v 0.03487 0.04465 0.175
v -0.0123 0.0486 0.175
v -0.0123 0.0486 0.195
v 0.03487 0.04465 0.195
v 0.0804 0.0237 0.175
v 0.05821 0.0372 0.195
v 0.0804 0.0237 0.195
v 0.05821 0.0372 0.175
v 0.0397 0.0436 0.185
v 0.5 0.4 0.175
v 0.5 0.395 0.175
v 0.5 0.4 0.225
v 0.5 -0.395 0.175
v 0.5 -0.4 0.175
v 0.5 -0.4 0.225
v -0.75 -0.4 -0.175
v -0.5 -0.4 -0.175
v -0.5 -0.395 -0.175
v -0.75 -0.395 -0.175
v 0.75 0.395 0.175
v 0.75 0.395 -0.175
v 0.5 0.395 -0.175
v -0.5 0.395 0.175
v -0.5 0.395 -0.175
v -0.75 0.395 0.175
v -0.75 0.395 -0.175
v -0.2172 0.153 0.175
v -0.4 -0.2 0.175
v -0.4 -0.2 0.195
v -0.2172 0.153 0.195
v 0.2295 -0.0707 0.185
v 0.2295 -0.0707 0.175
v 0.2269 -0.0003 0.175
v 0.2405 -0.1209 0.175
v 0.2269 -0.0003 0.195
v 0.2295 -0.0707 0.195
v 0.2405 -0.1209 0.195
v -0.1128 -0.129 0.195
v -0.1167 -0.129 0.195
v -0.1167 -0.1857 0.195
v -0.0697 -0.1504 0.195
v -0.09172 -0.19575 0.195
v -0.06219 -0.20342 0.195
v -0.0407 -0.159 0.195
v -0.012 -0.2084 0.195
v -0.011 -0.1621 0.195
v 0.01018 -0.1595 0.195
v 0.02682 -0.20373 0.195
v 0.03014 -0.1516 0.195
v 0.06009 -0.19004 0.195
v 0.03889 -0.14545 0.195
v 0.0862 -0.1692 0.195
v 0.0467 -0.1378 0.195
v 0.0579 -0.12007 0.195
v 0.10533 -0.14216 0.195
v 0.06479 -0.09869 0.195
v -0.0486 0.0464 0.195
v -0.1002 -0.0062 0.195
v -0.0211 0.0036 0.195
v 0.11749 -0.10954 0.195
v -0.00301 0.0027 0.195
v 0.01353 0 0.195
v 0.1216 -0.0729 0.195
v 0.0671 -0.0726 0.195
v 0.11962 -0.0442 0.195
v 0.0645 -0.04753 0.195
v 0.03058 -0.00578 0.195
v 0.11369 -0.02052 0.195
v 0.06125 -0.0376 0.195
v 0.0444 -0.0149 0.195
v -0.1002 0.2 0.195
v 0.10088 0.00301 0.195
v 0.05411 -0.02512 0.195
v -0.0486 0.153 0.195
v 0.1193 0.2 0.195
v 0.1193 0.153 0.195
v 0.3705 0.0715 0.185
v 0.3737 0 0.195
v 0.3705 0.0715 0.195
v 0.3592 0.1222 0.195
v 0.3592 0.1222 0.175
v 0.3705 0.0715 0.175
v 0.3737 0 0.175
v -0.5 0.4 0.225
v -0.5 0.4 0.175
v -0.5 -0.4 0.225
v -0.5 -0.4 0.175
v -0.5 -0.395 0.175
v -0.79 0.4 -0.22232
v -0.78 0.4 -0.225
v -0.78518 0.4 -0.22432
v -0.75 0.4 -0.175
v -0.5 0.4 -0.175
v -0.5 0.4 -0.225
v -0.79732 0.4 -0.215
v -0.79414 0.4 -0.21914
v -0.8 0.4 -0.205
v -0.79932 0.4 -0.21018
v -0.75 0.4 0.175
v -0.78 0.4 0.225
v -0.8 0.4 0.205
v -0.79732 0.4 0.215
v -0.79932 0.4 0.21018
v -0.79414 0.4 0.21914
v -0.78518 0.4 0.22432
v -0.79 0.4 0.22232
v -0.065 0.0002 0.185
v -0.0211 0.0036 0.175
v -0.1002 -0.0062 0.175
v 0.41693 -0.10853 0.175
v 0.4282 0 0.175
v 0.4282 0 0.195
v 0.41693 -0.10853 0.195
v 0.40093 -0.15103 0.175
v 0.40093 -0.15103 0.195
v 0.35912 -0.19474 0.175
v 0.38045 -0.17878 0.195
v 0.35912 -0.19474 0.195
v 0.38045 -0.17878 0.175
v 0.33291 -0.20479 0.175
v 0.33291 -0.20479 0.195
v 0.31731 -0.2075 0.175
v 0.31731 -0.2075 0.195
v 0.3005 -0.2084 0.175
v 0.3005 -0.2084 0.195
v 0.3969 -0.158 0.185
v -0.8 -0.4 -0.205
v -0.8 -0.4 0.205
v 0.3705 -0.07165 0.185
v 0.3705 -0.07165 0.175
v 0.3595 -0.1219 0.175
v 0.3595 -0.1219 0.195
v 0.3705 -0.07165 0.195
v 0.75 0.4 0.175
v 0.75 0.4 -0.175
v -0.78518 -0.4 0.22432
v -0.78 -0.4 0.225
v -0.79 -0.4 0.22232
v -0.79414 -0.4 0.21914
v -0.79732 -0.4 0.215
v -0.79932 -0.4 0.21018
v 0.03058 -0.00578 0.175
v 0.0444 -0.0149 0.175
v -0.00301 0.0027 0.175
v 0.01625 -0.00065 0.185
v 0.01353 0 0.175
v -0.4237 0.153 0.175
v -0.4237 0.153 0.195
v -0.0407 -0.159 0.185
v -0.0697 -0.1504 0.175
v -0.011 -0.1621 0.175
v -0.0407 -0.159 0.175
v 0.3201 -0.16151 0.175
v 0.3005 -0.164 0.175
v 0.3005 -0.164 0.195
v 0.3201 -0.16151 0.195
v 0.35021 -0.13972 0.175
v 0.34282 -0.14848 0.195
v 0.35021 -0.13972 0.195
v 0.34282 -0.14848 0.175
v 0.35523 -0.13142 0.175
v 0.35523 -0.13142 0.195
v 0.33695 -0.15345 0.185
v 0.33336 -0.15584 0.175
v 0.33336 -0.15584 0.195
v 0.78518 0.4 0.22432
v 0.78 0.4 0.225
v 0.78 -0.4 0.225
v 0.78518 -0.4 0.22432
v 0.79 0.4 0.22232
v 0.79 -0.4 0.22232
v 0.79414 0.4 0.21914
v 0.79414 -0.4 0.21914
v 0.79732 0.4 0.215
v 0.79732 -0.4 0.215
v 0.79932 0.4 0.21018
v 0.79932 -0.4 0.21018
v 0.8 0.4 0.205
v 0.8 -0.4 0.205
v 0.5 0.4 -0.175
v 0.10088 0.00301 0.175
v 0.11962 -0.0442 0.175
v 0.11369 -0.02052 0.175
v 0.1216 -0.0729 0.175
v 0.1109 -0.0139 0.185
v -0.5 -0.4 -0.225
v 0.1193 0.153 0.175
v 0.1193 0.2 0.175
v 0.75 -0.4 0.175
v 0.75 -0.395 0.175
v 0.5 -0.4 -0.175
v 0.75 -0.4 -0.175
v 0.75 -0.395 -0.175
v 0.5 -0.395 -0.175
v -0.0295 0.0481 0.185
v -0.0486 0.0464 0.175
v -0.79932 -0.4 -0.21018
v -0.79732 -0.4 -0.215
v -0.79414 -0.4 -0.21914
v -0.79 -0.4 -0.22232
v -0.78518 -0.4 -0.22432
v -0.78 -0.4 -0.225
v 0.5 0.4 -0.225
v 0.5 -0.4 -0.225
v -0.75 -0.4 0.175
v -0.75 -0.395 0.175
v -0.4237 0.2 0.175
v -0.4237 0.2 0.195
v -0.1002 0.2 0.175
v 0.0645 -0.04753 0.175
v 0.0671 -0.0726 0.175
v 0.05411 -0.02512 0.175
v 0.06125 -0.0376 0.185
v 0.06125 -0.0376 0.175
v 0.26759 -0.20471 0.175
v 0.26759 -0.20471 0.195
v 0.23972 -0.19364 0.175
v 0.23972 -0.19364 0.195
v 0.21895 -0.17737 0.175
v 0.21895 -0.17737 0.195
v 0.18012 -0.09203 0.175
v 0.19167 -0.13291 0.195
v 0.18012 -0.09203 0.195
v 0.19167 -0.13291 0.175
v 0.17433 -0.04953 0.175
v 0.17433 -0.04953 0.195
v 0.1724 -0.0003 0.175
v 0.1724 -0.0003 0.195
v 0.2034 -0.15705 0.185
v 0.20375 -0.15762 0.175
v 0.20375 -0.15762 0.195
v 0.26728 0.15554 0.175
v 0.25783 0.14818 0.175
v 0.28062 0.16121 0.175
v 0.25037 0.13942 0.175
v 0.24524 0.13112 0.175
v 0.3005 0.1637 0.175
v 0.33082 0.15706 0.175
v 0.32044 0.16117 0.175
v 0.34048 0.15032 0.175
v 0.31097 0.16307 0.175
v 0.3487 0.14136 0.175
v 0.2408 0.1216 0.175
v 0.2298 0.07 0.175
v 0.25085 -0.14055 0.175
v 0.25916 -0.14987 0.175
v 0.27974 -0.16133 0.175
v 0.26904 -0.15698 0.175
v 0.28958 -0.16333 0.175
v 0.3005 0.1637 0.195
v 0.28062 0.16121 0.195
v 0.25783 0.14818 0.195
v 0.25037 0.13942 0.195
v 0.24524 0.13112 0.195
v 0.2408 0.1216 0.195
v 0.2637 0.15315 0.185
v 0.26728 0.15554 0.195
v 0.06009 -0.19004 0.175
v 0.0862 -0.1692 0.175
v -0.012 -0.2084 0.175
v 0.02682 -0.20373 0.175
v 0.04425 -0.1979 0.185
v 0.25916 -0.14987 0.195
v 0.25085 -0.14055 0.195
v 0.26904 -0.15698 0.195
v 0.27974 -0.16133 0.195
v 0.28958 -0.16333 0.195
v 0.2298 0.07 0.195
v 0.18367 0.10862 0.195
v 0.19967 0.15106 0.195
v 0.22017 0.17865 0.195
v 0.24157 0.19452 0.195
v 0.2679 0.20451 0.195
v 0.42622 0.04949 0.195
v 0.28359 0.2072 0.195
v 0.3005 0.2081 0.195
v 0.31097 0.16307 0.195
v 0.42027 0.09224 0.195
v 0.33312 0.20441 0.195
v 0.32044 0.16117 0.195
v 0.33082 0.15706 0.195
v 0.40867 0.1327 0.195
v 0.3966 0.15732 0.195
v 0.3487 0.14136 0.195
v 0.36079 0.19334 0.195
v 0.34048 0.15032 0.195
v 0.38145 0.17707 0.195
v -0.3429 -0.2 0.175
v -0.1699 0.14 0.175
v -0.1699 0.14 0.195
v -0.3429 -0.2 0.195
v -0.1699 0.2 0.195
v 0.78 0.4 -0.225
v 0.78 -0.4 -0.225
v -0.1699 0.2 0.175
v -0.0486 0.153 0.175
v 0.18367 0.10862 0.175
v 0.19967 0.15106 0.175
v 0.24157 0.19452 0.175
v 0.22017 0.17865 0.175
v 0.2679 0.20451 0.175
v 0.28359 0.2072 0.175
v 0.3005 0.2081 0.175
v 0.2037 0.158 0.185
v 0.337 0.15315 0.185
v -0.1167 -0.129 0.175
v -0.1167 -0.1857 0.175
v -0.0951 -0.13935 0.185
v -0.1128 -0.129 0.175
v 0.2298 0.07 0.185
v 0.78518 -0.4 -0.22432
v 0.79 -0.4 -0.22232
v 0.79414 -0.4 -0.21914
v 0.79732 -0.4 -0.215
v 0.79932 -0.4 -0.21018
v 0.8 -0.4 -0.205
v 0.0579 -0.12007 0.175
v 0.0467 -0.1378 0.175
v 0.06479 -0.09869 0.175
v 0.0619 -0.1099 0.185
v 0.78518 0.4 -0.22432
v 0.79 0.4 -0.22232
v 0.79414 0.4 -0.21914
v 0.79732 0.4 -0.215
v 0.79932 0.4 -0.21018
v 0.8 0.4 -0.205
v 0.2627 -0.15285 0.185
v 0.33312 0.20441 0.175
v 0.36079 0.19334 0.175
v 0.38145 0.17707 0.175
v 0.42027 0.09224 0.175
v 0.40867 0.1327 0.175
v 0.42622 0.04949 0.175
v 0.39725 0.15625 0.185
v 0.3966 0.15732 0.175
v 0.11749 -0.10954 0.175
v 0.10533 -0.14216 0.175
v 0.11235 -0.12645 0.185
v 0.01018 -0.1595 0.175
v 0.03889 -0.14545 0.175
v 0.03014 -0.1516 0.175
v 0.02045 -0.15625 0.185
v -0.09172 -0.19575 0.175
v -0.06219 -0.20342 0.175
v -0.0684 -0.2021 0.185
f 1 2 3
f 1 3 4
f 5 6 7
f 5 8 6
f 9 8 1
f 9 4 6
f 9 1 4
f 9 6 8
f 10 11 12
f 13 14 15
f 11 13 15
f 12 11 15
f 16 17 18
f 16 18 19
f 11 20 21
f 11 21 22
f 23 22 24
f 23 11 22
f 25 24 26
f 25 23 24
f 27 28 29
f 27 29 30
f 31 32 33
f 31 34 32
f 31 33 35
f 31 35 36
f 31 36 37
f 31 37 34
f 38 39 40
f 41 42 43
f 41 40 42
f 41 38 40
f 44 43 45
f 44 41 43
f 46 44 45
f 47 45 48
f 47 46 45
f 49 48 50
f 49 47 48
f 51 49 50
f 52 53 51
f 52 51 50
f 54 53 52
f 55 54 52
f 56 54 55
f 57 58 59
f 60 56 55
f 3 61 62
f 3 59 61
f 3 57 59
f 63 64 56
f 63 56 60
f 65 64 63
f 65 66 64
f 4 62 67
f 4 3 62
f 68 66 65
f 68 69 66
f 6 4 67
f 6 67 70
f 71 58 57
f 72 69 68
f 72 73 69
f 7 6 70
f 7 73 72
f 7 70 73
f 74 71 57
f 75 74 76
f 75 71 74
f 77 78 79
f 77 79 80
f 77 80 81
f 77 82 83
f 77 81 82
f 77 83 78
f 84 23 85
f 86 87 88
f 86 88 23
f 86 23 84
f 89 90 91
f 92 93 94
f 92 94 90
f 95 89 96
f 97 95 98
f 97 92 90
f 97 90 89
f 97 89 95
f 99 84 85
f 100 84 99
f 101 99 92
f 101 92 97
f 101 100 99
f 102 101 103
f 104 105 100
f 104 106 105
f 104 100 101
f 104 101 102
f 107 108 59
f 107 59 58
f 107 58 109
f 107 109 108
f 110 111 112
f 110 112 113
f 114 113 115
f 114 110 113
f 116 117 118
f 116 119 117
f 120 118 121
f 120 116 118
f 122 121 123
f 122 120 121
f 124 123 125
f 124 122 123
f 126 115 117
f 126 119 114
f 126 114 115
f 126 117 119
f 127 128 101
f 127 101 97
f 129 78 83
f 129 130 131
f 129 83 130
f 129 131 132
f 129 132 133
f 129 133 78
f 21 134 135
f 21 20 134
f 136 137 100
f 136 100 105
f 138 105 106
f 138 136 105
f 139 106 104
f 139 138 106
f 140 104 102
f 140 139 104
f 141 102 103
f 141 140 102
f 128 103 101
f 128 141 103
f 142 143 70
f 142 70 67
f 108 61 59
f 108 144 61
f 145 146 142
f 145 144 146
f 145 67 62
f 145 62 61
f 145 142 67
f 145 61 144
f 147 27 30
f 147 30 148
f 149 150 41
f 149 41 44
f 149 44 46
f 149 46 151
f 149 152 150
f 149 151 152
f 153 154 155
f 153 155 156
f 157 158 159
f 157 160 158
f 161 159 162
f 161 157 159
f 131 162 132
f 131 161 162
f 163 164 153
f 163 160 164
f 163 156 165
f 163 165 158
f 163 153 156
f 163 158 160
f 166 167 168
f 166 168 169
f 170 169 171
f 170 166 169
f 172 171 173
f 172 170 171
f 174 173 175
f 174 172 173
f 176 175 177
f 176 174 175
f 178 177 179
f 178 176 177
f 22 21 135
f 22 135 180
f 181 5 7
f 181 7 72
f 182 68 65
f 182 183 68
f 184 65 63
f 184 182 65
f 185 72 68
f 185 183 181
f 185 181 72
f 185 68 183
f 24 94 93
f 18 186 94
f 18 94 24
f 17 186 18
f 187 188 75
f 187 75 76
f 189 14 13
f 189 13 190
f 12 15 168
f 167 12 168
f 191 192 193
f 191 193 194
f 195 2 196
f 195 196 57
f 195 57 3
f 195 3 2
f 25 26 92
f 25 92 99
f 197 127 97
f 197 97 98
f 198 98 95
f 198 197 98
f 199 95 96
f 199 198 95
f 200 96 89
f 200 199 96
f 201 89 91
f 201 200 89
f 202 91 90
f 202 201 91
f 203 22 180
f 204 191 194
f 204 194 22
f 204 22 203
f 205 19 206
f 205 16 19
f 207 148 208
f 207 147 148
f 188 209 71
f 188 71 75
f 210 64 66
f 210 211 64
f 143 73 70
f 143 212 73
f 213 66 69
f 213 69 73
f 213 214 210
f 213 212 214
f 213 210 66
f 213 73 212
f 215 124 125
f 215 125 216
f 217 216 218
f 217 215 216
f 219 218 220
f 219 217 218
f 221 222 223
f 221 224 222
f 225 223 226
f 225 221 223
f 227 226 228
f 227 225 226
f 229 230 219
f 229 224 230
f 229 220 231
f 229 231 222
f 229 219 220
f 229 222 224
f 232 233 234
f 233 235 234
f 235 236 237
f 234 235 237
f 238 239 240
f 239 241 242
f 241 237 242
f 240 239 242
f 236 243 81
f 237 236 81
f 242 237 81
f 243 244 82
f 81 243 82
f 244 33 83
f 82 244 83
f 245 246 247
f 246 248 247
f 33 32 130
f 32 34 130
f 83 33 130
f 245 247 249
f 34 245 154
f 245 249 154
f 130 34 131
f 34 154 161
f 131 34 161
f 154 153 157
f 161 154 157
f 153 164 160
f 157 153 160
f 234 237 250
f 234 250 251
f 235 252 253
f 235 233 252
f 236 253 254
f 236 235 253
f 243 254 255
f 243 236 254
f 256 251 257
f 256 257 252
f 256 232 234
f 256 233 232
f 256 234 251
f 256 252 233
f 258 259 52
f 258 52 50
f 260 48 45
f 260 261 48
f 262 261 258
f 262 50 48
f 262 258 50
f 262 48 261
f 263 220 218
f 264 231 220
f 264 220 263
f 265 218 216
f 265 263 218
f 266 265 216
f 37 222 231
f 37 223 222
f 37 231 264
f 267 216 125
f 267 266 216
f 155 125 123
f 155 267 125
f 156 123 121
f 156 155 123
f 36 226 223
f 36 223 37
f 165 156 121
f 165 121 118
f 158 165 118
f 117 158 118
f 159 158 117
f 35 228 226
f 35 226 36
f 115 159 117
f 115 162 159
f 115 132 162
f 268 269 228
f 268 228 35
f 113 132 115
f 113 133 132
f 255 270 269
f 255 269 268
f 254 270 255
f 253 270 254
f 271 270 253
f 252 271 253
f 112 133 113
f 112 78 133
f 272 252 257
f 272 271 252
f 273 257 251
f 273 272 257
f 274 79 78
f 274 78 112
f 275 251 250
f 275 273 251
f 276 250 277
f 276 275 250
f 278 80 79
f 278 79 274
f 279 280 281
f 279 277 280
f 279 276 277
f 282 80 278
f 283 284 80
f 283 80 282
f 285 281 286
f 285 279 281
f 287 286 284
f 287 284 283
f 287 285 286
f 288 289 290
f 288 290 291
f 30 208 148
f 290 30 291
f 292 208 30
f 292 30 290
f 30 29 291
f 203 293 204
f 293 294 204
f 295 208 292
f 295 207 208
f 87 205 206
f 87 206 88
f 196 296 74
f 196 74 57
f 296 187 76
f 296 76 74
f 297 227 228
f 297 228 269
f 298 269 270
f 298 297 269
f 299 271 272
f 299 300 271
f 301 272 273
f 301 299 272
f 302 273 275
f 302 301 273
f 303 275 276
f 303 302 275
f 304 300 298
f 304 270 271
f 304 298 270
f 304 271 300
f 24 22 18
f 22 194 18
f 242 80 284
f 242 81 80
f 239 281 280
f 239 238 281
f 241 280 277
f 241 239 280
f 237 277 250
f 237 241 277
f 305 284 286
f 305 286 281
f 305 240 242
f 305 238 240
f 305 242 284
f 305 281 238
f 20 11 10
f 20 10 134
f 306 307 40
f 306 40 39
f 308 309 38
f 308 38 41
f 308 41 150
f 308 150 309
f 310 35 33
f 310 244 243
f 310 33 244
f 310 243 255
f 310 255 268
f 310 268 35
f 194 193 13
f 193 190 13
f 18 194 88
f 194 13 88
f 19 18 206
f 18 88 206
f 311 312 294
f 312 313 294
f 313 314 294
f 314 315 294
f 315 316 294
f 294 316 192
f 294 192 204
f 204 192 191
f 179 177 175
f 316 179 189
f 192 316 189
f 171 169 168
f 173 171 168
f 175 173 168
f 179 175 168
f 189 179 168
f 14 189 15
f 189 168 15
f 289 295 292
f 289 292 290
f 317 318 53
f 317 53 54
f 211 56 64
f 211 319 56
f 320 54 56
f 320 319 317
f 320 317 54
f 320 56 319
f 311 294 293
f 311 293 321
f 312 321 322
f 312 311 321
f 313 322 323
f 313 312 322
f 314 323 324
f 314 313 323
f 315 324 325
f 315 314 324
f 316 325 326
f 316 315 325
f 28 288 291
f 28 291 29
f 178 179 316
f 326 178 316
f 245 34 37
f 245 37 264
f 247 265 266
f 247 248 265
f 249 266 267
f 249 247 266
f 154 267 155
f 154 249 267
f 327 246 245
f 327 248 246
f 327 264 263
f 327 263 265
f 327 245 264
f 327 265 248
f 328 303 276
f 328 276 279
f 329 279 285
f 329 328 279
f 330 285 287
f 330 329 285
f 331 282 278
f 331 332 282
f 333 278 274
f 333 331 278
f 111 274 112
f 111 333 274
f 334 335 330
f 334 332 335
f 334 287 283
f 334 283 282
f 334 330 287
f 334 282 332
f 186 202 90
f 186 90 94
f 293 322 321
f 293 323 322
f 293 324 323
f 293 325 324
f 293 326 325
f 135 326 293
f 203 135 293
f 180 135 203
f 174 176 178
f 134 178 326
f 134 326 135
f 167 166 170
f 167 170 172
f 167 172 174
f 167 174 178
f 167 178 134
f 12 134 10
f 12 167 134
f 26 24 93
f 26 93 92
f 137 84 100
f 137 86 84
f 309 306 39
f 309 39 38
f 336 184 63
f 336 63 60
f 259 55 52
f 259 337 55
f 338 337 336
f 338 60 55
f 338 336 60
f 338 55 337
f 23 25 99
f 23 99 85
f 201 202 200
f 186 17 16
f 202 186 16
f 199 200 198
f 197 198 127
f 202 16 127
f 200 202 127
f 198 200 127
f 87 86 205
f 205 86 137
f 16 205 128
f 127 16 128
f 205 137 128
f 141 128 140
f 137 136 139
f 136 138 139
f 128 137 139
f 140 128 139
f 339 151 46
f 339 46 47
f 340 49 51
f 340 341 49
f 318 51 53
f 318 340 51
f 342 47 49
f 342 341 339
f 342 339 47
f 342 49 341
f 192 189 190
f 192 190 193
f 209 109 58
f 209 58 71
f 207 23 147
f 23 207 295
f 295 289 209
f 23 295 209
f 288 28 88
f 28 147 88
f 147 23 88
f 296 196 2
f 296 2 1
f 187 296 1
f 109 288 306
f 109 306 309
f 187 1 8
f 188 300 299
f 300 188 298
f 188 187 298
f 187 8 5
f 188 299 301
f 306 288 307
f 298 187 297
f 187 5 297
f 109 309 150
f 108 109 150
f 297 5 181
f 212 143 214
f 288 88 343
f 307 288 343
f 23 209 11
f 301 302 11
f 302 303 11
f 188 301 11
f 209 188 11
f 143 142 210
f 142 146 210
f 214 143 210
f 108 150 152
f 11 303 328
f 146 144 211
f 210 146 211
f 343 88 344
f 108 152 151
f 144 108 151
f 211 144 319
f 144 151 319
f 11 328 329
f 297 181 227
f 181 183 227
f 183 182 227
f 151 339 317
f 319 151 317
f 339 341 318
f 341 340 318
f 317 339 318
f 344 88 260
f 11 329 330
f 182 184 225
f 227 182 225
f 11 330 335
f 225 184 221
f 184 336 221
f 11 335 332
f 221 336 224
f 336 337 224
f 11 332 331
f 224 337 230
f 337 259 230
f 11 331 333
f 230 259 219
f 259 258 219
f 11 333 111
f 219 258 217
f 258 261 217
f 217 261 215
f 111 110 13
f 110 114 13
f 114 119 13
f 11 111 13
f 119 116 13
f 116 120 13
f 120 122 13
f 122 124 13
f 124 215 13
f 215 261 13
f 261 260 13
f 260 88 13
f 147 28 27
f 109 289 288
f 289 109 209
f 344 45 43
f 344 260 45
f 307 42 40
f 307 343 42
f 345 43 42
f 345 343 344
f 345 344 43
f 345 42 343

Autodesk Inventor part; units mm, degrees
ref_plane "YZ Plane" through (0, 0, 0) normal (1, 0, 0) x (0, 1, 0)
ref_plane "XZ Plane" through (0, 0, 0) normal (0, 1, 0) x (-1, 0, 0)
ref_plane "XY Plane" through (0, 0, 0) normal (0, 0, 1) x (1, 0, 0)
sketch "Sketch1" plane through (0, 0, 0) normal (0, 1, 0) x (-1, 0, 0)
  line L0 (0.75, 0.175) -> (-0.75, 0.175)
  line L1 (-0.75, 0.175) -> (-0.75, -0.175)
  line L2 (-0.75, -0.175) -> (0.75, -0.175)
  line L3 (0.75, -0.175) -> (0.75, 0.175)
  line L4 (0.5, 0.175) -> (0.5, 0.225)
  line L5 (0.5, 0.225) -> (0.8, 0.225)
  line L6 (0.8, 0.225) -> (0.8, -0.225)
  line L7 (0.8, -0.225) -> (0.5, -0.225)
  line L8 (0.5, -0.225) -> (0.5, -0.175)
  line L9 (-0.5, 0.175) -> (-0.5, 0.225)
  line L10 (-0.5, 0.225) -> (-0.8, 0.225)
  line L11 (-0.8, 0.225) -> (-0.8, -0.225)
  line L12 (-0.8, -0.225) -> (-0.5, -0.225)
  line L13 (-0.5, -0.175) -> (-0.5, -0.225)
  line L14 (0.5, 0.175) -> (-0.5, 0.175)
  point P0 (0, 0)
  point P1 (0, 0.175)
  point P2 (0.75, 0)
  dimension "d0" = 1.6
  dimension "d1" = 0.05
  dimension "d2" = 0.05
  dimension "d3" = 0.45
  dimension "d4" = 0.3
extrude "Extrusion1" add sketch "Sketch1" along normal mid plane 0.8 contours L0 L4 L5 L6 L7 L8 L2 L3 | L0 L1 L2 L13 L12 L11 L10 L9
extrude "Extrusion2" add sketch "Sketch1" along normal mid plane 0.79 contours L3 L2 L1 L0
sketch "Sketch2" plane through (-0.5, -0.395, 0.175) normal (0, 0, 1) x (1, 0, 0)
  line L0 (0, 0) -> (0, 0.79) projected
  line L1 (1, 0) -> (0, 0) projected
  line L2 (1, 0) -> (1, 0.79) projected
  line L3 (0, 0.79) -> (1, 0.79) projected
  line L4 (0, 0.395) -> (1, 0.395) construction
  line L5 (0.3301, 0.535) -> (0.1571, 0.195)
  line L6 (0.1571, 0.195) -> (0.1, 0.195)
  line L7 (0.1, 0.195) -> (0.2828, 0.548)
  line L8 (0.2828, 0.548) -> (0.0763, 0.548)
  line L9 (0.0763, 0.548) -> (0.0763, 0.595)
  line L10 (0.0763, 0.595) -> (0.3301, 0.595)
  line L11 (0.3301, 0.595) -> (0.3301, 0.535)
  spline S0 degree 2 poles (0.6216, 0.3221) (0.6216, 0.2932) (0.6031, 0.2439) (0.5862, 0.2258) knots 0 0 0 1 2 2 2
  spline S1 degree 2 poles (0.5862, 0.2258) (0.5694, 0.2076) (0.5191, 0.1866) (0.488, 0.1866) knots 0 0 0 1 2 2 2
  spline S2 degree 2 poles (0.488, 0.1866) (0.4595, 0.1866) (0.4037, 0.1992) (0.3833, 0.2093) knots 0 0 0 1 2 2 2
  line L12 (0.3833, 0.2093) -> (0.3833, 0.266)
  line L13 (0.3833, 0.266) -> (0.3872, 0.266)
  spline S3 degree 2 poles (0.3872, 0.266) (0.3934, 0.2615) (0.4164, 0.2498) (0.4303, 0.2446) knots 0 0 0 1 2 2 2
  spline S4 degree 2 poles (0.4303, 0.2446) (0.4462, 0.2391) (0.4724, 0.2329) (0.489, 0.2329) knots 0 0 0 1 2 2 2
  spline S5 degree 2 poles (0.489, 0.2329) (0.5052, 0.2329) (0.5357, 0.2446) (0.5467, 0.2572) knots 0 0 0 1 2 2 2
  spline S6 degree 2 poles (0.5467, 0.2572) (0.5567, 0.2692) (0.5671, 0.301) (0.5671, 0.3224) knots 0 0 0 1 2 2 2
  spline S7 degree 2 poles (0.5671, 0.3224) (0.5671, 0.3438) (0.5554, 0.371) (0.5444, 0.3801) knots 0 0 0 1 2 2 2
  spline S8 degree 2 poles (0.5444, 0.3801) (0.5331, 0.3901) (0.4994, 0.3986) (0.4789, 0.3986) knots 0 0 0 1 2 2 2
  spline S9 degree 2 poles (0.4789, 0.3986) (0.4569, 0.3986) (0.4131, 0.3918) (0.3998, 0.3888) knots 0 0 0 1 2 2 2
  line L14 (0.3998, 0.3888) -> (0.3998, 0.595)
  line L15 (0.3998, 0.595) -> (0.6193, 0.595)
  line L16 (0.6193, 0.595) -> (0.6193, 0.548)
  line L17 (0.6193, 0.548) -> (0.4514, 0.548)
  line L18 (0.4514, 0.548) -> (0.4514, 0.4414)
  spline S10 degree 2 poles (0.4514, 0.4414) (0.4611, 0.4426) (0.4799, 0.4436) (0.4877, 0.4436) knots 0 0 0 1 2 2 2
  spline S11 degree 2 poles (0.4877, 0.4436) (0.5185, 0.4436) (0.5609, 0.4336) (0.5804, 0.4187) knots 0 0 0 1 2 2 2
  spline S12 degree 2 poles (0.5804, 0.4187) (0.6002, 0.4038) (0.6216, 0.3584) (0.6216, 0.3221) knots 0 0 0 1 2 2 2
  spline S13 degree 2 poles (0.9282, 0.395) (0.9282, 0.2874) (0.8656, 0.1866) (0.8005, 0.1866) knots 0 0 0 1 2 2 2
  spline S14 degree 2 poles (0.8005, 0.1866) (0.7344, 0.1866) (0.6724, 0.2893) (0.6724, 0.3947) knots 0 0 0 1 2 2 2
  spline S15 degree 2 poles (0.6724, 0.3947) (0.6724, 0.5029) (0.735, 0.6031) (0.8005, 0.6031) knots 0 0 0 1 2 2 2
  spline S16 degree 2 poles (0.8005, 0.6031) (0.8663, 0.6031) (0.9282, 0.4994) (0.9282, 0.395) knots 0 0 0 1 2 2 2
  spline S17 degree 2 poles (0.8595, 0.2731) (0.8673, 0.2929) (0.8737, 0.3538) (0.8737, 0.395) knots 0 0 0 1 2 2 2
  spline S18 degree 2 poles (0.8737, 0.395) (0.8737, 0.4362) (0.8673, 0.4968) (0.8592, 0.5172) knots 0 0 0 1 2 2 2
  spline S19 degree 2 poles (0.8592, 0.5172) (0.8511, 0.5376) (0.8229, 0.5587) (0.8005, 0.5587) knots 0 0 0 1 2 2 2
  spline S20 degree 2 poles (0.8005, 0.5587) (0.7781, 0.5587) (0.7493, 0.5376) (0.7408, 0.5166) knots 0 0 0 1 2 2 2
  spline S21 degree 2 poles (0.7408, 0.5166) (0.7327, 0.4961) (0.7269, 0.4339) (0.7269, 0.3947) knots 0 0 0 1 2 2 2
  spline S22 degree 2 poles (0.7269, 0.3947) (0.7269, 0.3525) (0.7321, 0.2961) (0.7405, 0.2741) knots 0 0 0 1 2 2 2
  spline S23 degree 2 poles (0.7405, 0.2741) (0.7483, 0.2533) (0.7771, 0.231) (0.8005, 0.231) knots 0 0 0 1 2 2 2
  spline S24 degree 2 poles (0.8005, 0.231) (0.8225, 0.231) (0.8514, 0.2521) (0.8595, 0.2731) knots 0 0 0 1 2 2 2
  point P0 (0.5, 0.395)
extrude "Extrusion3" add sketch "Sketch2" along normal blind 0.02 contours L5 L6 L7 L8 L9 L10 L11 | S0 S1 S2 L12 L13 S3 S4 S5 S6 S7 S8 S9 L14 L15 L16 L17 L18 S10 S11 S12 | S13 S14 S15 S16
fillet "Fillet1" radius 0.02 4 edges at (-0.8, 0, 0.225) (-0.8, 0, -0.225) (0.8, 0, 0.225) (0.8, 0, -0.225)
equation "\"d2\" = d1"
properties part number "21-1001" material "Copper"
